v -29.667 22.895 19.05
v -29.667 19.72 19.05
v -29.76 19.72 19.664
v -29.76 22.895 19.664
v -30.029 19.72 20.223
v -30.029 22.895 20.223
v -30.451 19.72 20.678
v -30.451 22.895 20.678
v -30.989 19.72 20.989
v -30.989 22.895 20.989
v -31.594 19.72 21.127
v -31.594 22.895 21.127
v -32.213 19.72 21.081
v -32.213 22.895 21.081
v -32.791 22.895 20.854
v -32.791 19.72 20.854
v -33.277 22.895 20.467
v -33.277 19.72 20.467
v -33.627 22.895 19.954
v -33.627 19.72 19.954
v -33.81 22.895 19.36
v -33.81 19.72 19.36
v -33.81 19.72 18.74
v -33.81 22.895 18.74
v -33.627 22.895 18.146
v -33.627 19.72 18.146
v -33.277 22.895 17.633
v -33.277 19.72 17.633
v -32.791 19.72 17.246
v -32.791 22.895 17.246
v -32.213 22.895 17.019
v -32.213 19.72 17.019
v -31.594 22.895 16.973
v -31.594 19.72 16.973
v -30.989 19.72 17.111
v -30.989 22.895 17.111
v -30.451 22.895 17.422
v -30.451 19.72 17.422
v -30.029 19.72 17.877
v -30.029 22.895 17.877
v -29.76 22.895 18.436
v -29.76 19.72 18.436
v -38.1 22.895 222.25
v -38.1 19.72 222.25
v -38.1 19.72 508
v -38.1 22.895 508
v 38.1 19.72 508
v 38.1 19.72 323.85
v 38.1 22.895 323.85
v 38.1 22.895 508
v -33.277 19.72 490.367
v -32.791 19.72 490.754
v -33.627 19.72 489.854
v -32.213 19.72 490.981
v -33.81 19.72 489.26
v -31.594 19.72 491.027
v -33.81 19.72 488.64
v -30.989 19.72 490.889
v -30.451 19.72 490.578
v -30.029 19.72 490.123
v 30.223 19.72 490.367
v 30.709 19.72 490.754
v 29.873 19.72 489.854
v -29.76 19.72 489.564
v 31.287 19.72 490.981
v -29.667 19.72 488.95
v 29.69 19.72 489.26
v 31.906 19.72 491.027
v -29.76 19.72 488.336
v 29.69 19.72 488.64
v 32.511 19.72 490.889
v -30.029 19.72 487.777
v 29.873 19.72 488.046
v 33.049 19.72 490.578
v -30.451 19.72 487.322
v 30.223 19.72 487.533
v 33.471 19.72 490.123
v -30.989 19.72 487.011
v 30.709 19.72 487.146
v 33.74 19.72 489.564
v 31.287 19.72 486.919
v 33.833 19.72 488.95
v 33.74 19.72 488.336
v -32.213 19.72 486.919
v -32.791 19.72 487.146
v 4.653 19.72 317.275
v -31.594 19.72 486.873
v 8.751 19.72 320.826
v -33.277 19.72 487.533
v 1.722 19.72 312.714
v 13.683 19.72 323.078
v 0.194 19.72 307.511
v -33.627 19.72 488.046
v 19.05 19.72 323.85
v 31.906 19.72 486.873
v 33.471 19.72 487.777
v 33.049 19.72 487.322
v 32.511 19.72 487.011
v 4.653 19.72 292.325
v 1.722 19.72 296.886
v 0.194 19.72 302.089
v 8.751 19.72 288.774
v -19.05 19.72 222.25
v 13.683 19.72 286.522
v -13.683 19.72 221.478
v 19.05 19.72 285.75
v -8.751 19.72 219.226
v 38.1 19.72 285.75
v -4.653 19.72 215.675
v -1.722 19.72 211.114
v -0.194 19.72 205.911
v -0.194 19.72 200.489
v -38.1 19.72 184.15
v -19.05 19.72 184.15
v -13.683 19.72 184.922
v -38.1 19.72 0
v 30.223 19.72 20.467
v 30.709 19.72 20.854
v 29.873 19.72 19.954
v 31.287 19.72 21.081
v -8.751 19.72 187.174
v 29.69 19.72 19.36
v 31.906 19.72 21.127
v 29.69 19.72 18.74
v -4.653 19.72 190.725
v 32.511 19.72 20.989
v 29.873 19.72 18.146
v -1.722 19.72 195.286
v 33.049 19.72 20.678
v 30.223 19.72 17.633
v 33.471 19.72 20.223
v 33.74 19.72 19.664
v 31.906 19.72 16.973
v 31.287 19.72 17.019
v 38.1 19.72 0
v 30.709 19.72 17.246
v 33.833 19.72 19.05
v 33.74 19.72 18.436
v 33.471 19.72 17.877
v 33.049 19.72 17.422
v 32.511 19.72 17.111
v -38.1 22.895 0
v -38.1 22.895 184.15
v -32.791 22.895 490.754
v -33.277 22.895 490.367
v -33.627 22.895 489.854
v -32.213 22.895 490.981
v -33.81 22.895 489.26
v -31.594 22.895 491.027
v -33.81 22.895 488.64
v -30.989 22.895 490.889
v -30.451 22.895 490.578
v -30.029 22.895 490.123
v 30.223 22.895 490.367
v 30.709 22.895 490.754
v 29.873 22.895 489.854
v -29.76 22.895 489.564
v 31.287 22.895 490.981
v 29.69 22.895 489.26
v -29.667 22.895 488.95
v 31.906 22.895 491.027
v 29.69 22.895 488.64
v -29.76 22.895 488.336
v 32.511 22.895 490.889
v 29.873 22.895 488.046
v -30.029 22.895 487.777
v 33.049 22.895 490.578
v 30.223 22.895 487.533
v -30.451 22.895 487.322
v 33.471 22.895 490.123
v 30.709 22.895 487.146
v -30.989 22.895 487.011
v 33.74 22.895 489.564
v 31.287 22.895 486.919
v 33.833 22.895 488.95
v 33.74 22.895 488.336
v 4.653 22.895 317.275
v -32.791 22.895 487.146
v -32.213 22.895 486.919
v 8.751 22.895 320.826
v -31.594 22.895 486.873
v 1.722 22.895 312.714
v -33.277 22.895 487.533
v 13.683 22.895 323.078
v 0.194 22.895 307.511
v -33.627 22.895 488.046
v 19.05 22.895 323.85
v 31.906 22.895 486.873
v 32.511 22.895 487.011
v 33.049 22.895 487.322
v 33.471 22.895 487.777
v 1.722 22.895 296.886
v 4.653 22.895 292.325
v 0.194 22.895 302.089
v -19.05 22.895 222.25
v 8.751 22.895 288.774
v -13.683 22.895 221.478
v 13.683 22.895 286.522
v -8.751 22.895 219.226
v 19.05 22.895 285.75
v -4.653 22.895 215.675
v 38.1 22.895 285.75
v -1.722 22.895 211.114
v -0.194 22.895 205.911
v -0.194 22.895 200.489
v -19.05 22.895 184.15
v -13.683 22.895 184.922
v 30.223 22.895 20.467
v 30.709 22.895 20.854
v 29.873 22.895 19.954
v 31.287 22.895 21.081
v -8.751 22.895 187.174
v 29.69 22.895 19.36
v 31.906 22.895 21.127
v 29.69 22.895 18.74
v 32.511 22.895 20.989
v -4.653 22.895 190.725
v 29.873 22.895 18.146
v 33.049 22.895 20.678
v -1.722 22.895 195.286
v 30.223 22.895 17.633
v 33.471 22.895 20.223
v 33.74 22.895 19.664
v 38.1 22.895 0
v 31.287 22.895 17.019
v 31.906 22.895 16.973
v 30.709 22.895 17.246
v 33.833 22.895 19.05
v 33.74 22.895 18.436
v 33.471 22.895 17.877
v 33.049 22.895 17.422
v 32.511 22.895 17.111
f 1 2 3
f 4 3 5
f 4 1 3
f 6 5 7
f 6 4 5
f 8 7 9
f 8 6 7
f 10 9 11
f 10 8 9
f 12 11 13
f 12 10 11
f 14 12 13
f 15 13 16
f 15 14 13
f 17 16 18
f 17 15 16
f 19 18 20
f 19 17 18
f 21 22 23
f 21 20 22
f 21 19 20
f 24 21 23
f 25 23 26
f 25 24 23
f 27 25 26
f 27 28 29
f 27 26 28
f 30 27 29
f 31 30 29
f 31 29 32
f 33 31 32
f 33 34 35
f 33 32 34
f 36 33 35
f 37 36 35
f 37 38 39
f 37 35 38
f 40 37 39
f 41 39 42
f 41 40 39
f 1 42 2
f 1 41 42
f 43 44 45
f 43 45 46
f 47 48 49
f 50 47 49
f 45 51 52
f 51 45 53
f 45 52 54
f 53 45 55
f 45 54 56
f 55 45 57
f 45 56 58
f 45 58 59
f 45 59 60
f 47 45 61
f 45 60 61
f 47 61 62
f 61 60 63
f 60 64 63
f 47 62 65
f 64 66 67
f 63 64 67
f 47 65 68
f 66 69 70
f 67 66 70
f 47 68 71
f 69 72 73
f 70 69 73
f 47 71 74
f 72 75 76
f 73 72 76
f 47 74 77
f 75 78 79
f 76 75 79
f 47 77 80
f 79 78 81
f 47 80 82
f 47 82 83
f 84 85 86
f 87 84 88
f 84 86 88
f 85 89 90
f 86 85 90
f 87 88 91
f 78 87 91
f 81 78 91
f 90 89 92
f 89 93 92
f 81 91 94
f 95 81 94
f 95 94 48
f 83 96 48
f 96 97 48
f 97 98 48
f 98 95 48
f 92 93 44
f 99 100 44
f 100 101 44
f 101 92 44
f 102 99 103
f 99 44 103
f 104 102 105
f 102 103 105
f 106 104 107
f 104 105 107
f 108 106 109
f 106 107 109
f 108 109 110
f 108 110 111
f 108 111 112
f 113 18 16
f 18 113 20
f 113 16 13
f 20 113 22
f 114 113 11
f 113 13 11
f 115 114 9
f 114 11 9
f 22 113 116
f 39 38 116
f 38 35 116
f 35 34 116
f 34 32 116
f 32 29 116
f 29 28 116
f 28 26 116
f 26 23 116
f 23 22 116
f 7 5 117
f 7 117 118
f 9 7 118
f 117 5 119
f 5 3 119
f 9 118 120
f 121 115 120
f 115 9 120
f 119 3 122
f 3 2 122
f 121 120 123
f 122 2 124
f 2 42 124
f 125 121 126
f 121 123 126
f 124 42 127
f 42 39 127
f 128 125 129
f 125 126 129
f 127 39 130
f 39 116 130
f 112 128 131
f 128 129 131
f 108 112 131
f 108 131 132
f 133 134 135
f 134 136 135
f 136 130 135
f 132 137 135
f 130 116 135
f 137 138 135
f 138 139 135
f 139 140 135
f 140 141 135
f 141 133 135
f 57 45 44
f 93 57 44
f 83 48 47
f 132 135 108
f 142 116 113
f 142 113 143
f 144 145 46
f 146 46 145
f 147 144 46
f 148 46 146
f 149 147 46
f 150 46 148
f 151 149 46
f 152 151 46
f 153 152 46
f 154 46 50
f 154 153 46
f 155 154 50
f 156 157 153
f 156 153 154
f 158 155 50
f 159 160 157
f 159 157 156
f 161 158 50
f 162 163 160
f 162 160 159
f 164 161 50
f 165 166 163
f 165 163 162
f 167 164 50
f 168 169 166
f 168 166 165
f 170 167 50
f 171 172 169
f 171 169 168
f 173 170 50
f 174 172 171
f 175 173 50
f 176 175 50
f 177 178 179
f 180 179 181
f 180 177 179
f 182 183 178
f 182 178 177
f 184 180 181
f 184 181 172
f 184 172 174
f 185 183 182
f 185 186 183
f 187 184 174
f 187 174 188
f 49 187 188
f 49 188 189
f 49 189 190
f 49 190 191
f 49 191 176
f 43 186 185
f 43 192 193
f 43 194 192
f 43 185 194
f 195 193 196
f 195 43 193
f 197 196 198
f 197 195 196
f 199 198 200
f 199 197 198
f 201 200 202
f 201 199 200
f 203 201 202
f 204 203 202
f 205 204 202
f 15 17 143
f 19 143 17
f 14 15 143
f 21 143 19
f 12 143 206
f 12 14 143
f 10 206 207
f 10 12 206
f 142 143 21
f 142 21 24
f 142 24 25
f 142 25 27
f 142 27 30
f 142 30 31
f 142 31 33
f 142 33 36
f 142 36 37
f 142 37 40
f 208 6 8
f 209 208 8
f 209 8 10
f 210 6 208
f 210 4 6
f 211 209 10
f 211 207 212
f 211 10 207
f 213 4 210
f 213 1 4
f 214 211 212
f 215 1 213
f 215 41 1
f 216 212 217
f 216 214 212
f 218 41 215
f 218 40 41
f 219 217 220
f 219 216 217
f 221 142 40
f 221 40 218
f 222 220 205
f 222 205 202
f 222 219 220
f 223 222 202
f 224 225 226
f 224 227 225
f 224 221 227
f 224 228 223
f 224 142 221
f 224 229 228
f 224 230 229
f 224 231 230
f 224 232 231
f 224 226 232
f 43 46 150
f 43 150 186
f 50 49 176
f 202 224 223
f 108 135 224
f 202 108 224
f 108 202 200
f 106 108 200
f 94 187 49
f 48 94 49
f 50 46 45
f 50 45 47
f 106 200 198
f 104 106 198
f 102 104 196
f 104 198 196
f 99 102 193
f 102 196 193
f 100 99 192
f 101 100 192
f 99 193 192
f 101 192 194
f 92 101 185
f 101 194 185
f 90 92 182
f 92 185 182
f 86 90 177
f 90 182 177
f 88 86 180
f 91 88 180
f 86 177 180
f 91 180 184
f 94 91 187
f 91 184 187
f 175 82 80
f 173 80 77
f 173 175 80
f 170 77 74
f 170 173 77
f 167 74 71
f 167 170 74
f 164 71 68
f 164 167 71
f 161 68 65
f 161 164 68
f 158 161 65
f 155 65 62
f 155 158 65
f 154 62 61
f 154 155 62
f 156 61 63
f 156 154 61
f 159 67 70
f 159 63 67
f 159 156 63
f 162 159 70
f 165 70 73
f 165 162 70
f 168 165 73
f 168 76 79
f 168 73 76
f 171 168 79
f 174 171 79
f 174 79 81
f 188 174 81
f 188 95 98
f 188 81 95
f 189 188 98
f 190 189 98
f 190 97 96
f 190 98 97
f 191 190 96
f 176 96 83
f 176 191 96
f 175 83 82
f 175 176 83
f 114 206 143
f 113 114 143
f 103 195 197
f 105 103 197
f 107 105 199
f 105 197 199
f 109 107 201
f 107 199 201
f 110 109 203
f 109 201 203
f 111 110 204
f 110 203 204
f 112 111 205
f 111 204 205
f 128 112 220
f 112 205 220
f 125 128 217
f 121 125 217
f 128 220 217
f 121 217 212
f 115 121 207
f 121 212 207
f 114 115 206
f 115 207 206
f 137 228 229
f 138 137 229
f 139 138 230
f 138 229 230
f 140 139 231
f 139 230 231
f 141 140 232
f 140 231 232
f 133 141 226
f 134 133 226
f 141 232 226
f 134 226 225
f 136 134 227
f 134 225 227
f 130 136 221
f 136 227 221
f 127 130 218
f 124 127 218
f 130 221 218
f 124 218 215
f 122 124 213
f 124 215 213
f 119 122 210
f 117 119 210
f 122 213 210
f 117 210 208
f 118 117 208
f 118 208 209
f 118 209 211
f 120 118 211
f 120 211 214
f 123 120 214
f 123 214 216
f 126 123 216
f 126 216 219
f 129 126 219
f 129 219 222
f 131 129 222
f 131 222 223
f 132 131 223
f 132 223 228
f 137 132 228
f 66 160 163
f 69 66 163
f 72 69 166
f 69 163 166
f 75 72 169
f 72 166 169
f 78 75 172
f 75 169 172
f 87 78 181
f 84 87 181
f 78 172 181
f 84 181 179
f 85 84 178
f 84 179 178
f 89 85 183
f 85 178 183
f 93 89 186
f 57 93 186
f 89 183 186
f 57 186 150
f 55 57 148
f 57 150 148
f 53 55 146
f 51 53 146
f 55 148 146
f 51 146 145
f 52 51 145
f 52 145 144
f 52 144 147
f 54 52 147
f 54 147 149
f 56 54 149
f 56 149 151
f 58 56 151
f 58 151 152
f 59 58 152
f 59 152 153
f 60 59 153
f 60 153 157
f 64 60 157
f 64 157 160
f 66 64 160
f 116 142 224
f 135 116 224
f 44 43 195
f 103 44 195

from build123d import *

# Parameters (mm, degrees)
SKETCH1_W           = 76.2
SKETCH1_H           = 3.175
BOSS_EXTRUDE1_DEPTH = 508
CUT_EXTRUDE1_DEPTH  = 4.175
SKETCH4_R           = 2.0828
CUT_EXTRUDE2_DEPTH  = 4.175


with BuildPart() as part:
    # Sketch1 → Boss-Extrude1 (new body)
    with BuildSketch(Plane.XY):
        with Locations((0, 21.307750599)):
            Rectangle(SKETCH1_W, SKETCH1_H)
    extrude(amount=BOSS_EXTRUDE1_DEPTH)

    # Sketch2 → Cut-Extrude1 (cut, through all)
    with BuildSketch(Plane(origin=(0, 22.895250599, 0), x_dir=(1, 0, 0), z_dir=(0, 1, 0))):
        with BuildLine():
            Line((-19.05, -184.15), (-38.1, -184.15))
            Line((-38.1, -184.15), (-38.1, -222.25))
            Line((-38.1, -222.25), (-19.05, -222.25))
            ThreePointArc((-19.05, -222.25), (0, -203.2), (-19.05, -184.15))
        make_face()
        with BuildLine():
            Line((19.05, -323.85), (38.1, -323.85))
            Line((38.1, -323.85), (38.1, -285.75))
            Line((38.1, -285.75), (19.05, -285.75))
            ThreePointArc((19.05, -285.75), (0, -304.8), (19.05, -323.85))
        make_face()
    extrude(amount=-CUT_EXTRUDE1_DEPTH, mode=Mode.SUBTRACT)

    # Sketch4 → Cut-Extrude2 (cut, through all)
    with BuildSketch(Plane(origin=(0, 22.895250599, 0), x_dir=(1, 0, 0), z_dir=(0, 1, 0))):
        with Locations((-31.75, -488.95)):
            Circle(SKETCH4_R)
        with Locations((31.75, -19.05)):
            Circle(SKETCH4_R)
    cut_extrude2 = extrude(amount=-CUT_EXTRUDE2_DEPTH, mode=Mode.SUBTRACT)

    # Mirror2: Cut-Extrude2 across plane
    add(cut_extrude2.mirror(Plane.XY.offset(254)), mode=Mode.SUBTRACT)


solid = part.part
